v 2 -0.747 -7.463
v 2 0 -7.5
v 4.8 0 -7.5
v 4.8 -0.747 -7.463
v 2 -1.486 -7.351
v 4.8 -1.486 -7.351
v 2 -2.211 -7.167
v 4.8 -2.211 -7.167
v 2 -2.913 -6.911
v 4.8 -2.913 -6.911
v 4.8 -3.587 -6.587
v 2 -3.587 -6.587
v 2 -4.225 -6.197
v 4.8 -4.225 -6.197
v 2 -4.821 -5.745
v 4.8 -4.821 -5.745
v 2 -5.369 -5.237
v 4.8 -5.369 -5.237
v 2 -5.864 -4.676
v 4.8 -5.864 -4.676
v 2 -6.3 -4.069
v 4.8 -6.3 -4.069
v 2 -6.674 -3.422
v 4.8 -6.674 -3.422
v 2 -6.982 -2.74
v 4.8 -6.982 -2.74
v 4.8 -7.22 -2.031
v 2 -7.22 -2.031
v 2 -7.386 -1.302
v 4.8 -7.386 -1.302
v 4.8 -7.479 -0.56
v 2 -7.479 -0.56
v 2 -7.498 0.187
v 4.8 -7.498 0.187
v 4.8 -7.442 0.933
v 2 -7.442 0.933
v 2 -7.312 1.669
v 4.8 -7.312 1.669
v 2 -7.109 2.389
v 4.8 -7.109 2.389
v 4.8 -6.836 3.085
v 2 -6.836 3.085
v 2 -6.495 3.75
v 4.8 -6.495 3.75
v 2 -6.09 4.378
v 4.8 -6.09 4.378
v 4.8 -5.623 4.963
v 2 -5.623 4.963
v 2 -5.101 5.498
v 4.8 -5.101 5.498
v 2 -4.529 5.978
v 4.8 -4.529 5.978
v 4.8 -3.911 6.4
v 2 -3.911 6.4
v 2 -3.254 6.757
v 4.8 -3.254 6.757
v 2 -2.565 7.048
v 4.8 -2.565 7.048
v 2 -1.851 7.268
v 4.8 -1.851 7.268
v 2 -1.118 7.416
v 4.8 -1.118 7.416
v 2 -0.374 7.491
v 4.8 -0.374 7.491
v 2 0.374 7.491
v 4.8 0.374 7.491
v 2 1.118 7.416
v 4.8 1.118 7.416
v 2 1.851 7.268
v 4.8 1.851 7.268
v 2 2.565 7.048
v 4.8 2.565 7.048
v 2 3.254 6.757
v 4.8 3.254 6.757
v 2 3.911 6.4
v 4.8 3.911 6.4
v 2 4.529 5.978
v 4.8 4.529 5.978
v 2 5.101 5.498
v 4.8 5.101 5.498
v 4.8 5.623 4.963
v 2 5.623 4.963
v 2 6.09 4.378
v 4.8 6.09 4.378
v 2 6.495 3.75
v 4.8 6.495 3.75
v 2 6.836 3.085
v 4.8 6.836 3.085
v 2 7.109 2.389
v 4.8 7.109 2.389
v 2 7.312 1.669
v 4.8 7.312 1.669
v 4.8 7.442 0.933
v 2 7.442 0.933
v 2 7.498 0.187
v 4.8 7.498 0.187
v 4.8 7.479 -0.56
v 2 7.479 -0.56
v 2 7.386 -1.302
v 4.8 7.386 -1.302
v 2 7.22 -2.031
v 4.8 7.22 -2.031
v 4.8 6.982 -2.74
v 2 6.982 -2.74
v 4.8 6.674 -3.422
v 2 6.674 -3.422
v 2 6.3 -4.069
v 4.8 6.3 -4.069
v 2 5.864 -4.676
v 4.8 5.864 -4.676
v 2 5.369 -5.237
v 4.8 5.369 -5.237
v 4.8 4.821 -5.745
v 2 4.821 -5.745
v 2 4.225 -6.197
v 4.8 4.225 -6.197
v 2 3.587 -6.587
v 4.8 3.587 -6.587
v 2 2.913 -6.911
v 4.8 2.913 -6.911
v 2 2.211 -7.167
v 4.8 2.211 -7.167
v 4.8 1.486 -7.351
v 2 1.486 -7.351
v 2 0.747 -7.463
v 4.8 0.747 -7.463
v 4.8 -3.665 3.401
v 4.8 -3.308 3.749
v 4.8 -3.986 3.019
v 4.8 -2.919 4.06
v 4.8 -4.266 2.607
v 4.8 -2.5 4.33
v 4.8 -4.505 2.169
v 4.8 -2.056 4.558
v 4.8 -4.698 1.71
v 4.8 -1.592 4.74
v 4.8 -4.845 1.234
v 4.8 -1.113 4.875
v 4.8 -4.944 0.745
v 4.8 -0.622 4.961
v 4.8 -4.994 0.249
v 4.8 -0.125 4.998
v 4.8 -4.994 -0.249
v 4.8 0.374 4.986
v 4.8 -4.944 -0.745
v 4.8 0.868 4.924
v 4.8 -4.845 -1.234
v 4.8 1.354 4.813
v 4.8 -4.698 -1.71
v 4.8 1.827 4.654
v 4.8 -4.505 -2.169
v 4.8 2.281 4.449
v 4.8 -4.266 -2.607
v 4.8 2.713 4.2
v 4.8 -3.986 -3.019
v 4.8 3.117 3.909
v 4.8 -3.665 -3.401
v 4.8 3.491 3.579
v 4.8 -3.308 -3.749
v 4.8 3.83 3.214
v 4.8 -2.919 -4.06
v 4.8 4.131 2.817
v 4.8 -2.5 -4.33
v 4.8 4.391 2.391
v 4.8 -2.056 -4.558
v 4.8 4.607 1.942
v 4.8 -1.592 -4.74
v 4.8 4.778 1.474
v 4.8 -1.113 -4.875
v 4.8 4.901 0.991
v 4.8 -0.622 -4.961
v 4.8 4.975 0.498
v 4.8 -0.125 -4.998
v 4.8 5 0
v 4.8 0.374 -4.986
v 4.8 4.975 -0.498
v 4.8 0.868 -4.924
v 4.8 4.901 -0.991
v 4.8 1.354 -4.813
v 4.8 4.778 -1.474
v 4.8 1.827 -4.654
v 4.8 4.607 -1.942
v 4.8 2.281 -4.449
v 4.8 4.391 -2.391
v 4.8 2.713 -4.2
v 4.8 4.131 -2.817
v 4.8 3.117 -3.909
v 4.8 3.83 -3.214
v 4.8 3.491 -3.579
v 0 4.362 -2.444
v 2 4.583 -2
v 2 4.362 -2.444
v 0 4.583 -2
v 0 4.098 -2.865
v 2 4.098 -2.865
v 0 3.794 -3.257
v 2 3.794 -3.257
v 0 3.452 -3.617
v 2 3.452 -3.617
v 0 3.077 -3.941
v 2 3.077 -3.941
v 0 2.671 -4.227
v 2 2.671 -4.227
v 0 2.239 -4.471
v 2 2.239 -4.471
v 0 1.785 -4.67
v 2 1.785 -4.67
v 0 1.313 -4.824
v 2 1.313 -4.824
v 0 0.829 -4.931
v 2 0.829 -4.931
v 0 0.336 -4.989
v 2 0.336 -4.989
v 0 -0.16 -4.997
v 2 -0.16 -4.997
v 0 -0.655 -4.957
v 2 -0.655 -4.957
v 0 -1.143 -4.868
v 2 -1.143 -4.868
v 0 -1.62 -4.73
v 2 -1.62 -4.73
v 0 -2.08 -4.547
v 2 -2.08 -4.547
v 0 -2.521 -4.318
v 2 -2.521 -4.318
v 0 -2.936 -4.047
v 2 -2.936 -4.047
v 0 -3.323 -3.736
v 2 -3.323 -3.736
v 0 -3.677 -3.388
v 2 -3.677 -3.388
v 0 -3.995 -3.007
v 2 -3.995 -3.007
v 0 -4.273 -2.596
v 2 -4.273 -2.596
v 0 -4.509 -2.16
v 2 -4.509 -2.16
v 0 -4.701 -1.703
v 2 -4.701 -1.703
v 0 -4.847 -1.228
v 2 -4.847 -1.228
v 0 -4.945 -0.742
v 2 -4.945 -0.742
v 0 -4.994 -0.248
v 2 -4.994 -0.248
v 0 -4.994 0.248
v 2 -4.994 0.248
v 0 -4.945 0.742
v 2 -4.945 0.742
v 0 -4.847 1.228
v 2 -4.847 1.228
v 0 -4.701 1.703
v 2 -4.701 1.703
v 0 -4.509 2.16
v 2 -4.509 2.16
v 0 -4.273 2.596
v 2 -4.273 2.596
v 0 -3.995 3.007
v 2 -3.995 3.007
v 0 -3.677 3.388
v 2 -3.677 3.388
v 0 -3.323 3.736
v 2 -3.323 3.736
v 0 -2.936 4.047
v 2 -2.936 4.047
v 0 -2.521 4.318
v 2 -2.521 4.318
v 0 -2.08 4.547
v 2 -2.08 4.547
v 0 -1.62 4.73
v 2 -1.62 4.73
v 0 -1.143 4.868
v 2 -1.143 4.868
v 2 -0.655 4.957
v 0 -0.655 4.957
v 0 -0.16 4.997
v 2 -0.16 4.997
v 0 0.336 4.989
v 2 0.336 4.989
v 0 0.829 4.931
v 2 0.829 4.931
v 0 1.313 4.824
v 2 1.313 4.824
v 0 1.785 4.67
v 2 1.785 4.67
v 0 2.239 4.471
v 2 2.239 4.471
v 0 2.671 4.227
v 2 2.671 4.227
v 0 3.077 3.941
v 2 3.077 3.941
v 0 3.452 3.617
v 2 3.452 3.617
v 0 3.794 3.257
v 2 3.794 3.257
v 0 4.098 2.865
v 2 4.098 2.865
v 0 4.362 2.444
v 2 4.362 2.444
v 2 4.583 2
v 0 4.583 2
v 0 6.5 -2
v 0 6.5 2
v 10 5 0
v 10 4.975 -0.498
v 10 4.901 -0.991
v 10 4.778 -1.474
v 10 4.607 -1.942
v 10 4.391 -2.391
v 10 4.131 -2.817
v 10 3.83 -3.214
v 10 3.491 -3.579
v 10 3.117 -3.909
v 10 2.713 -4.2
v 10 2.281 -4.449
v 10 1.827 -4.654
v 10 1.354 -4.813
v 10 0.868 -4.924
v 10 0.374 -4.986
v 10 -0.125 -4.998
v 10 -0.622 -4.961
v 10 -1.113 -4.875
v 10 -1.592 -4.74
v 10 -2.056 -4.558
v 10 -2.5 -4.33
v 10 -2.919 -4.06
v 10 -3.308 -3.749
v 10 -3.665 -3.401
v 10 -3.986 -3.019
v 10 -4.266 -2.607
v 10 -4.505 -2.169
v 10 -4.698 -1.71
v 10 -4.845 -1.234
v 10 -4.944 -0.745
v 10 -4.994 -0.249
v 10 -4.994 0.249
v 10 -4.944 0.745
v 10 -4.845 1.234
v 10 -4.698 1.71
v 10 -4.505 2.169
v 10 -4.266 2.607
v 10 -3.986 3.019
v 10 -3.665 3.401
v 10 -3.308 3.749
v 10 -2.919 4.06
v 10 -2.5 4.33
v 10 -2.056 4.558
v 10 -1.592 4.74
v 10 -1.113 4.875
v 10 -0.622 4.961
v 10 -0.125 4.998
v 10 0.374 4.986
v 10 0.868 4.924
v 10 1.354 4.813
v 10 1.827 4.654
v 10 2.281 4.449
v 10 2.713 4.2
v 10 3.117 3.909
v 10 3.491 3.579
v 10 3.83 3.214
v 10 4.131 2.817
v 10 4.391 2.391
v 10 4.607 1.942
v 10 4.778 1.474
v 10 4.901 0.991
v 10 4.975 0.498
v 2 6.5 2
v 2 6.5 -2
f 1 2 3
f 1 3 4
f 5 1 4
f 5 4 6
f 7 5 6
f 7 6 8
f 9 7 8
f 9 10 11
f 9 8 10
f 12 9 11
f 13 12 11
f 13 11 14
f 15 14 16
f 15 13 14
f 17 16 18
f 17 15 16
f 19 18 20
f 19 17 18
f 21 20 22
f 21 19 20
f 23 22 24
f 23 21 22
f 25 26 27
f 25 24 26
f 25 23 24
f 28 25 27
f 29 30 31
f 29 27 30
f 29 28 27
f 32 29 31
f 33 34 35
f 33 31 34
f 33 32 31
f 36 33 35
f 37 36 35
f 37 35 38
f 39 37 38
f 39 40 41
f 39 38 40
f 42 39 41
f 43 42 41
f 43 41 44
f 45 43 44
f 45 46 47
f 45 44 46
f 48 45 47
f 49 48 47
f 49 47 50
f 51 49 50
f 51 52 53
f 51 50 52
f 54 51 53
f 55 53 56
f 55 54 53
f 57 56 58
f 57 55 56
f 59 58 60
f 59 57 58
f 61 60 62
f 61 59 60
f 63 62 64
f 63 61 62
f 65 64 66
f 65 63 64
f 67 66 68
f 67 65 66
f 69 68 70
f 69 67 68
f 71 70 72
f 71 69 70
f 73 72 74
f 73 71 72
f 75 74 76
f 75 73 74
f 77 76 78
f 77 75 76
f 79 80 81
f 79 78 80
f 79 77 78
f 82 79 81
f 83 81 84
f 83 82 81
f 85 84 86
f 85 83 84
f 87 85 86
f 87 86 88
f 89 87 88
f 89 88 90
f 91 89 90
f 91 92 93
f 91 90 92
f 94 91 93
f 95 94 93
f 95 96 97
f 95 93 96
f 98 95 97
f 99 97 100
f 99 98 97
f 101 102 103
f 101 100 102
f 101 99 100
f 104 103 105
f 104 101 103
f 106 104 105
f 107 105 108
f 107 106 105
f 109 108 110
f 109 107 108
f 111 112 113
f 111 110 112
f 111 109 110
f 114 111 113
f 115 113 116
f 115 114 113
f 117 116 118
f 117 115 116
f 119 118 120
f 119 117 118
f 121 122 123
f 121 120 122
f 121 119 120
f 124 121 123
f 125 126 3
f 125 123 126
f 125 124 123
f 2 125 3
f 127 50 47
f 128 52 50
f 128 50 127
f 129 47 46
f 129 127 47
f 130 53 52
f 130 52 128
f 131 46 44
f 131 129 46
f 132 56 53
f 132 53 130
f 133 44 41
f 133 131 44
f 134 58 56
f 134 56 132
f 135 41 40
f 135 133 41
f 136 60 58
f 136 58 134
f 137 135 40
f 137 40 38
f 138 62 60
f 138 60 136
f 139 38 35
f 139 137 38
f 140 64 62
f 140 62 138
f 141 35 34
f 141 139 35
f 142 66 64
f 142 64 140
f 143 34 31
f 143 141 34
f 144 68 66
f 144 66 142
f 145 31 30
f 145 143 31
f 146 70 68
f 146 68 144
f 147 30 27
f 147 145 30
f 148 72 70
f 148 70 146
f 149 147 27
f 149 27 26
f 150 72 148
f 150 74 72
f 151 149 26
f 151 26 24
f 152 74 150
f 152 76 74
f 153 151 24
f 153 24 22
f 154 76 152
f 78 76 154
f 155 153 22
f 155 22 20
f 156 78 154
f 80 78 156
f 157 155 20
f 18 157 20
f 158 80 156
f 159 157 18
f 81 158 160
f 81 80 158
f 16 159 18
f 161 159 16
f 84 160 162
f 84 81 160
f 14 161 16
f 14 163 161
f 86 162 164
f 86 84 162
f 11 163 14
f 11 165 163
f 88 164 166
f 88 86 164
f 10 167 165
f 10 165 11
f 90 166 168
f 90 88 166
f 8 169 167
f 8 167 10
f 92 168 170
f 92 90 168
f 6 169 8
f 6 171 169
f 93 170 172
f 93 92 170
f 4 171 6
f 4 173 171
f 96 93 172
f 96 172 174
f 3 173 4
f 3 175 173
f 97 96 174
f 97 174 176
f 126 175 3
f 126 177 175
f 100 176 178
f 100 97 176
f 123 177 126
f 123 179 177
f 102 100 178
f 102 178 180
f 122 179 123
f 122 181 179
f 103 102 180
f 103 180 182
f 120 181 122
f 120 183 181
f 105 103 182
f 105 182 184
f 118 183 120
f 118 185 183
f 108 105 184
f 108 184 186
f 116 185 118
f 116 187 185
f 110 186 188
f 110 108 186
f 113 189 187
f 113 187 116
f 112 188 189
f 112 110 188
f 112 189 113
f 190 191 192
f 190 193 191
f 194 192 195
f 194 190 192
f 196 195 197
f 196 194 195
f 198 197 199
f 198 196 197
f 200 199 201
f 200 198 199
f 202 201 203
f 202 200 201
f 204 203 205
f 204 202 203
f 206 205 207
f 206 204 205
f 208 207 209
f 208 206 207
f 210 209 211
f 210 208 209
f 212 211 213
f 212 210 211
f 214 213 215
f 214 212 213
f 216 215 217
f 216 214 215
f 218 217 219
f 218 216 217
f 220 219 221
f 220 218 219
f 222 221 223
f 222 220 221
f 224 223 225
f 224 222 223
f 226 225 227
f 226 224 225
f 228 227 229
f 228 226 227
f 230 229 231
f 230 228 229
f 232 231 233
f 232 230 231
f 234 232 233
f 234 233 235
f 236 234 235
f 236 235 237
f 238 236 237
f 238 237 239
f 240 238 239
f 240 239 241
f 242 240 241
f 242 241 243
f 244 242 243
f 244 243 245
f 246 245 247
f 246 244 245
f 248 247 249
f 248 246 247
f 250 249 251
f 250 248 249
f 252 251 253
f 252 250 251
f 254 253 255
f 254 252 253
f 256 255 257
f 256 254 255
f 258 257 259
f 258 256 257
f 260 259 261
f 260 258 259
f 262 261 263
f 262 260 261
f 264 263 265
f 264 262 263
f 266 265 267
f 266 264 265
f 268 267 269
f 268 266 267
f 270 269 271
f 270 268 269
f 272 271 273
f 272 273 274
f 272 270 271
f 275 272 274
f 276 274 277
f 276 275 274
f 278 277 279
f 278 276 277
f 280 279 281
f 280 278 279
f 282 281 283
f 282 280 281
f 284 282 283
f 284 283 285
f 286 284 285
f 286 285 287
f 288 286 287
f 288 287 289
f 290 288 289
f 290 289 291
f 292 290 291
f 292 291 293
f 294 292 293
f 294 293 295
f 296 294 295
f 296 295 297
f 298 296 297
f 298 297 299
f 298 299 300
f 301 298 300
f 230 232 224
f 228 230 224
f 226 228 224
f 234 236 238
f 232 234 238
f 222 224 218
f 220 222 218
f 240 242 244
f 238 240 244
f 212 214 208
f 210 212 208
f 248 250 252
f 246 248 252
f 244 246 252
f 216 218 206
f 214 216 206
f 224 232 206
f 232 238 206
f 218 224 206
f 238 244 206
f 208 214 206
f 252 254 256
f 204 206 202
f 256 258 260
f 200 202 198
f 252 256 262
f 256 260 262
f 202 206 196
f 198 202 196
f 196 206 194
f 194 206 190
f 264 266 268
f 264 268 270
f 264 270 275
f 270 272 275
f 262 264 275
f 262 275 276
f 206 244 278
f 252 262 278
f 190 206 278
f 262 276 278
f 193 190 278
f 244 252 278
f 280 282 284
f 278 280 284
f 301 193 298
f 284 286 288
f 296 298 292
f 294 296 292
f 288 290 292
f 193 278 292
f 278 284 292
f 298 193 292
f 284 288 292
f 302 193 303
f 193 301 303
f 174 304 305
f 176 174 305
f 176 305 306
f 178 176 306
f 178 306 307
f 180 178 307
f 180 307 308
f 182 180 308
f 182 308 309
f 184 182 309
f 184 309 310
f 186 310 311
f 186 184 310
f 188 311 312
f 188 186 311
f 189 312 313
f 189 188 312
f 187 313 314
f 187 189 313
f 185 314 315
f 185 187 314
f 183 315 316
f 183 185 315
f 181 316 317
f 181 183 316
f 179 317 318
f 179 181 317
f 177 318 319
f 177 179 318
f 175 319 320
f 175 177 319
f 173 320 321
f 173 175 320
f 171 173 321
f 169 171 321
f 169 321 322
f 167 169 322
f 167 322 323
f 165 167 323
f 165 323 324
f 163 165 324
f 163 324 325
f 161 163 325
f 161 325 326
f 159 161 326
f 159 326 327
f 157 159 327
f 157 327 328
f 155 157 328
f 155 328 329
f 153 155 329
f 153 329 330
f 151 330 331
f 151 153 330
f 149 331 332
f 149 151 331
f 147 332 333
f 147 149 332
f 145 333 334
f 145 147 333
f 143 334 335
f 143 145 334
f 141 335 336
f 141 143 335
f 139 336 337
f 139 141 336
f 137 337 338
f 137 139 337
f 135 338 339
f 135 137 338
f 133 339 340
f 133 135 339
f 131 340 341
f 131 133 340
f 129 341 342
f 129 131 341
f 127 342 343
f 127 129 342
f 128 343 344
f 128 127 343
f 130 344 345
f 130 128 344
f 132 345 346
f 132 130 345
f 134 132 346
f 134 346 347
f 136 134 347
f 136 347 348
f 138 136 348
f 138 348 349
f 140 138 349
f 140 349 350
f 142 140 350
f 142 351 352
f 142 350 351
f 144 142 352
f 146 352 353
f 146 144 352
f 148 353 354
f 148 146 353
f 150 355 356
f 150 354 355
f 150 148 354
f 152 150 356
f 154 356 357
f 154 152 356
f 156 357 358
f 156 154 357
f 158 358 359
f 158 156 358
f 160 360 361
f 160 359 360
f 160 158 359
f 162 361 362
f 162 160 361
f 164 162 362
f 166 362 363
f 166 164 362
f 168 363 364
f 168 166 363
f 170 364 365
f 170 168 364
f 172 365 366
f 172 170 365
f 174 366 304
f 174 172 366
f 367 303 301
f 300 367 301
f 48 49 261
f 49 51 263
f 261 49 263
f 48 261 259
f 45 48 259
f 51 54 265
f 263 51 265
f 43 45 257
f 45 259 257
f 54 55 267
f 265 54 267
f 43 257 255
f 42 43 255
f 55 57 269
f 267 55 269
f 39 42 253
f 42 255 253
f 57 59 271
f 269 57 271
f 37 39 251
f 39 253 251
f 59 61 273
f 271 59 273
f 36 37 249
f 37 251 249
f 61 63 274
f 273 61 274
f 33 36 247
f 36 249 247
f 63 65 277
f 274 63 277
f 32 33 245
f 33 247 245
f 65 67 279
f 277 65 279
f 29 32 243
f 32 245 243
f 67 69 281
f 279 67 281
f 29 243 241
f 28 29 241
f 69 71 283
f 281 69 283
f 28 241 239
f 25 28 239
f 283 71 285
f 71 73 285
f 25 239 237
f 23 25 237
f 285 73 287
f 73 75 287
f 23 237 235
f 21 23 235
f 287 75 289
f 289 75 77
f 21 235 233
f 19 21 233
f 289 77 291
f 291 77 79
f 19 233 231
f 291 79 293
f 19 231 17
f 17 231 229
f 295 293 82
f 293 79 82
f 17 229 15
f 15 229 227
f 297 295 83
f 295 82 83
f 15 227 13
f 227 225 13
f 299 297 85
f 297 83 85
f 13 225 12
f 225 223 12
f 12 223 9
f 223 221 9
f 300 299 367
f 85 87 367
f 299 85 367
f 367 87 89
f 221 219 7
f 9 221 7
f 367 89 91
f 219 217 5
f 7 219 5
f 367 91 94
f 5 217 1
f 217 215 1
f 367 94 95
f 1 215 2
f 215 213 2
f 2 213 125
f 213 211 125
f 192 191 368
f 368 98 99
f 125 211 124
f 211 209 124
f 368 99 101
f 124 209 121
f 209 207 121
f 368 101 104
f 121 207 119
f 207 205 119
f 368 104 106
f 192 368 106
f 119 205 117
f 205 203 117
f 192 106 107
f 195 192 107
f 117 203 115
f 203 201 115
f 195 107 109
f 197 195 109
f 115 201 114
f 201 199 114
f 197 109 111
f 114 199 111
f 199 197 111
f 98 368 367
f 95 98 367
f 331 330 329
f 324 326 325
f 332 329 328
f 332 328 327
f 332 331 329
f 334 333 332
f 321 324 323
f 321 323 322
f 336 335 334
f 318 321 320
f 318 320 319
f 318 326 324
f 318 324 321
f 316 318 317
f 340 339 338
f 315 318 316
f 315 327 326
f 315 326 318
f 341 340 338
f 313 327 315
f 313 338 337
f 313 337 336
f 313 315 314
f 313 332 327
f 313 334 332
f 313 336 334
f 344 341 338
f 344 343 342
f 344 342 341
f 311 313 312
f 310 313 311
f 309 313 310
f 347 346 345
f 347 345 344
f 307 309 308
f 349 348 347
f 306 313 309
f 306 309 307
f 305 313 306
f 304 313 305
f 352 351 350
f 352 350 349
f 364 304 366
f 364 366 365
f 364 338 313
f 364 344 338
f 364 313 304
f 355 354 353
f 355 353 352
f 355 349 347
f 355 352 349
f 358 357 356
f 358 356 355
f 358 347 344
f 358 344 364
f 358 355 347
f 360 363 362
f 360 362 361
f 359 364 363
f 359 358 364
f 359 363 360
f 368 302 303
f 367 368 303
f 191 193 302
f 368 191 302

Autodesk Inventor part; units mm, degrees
ref_plane "YZ Plane" through (0, 0, 0) normal (1, 0, 0) x (0, 1, 0)
ref_plane "XZ Plane" through (0, 0, 0) normal (0, 1, 0) x (-1, 0, 0)
ref_plane "XY Plane" through (0, 0, 0) normal (0, 0, 1) x (1, 0, 0)
sketch "Sketch1" plane through (0, 0, 0) normal (1, 0, 0) x (0, 1, 0)
  circle A0 centre (0, 0) radius 5
  dimension "d0" = 10
extrude "Extrusion1" add sketch "Sketch1" along normal blind 10
sketch "Sketch2" plane through (0, 0, 0) normal (-1, 0, 0) x (0, 0, 1)
  circle A0 centre (0, 0) radius 5 projected
  line L0 (-2, 6.5) -> (2, 6.5)
  line L1 (2, 6.5) -> (2, 0)
  line L2 (2, 0) -> (-2, 0)
  line L3 (-2, 0) -> (-2, 6.5)
  point P0 (0, -5)
  point P1 (-2, 4.5826)
  point P2 (2, 4.5826)
  dimension "d3" = 11.5
  dimension "d4" = 4
extrude "Extrusion2" add sketch "Sketch2" against normal blind 2 contours A0 L3 L0 L1
sketch "Sketch3" plane through (2, 0, 0) normal (1, 0, 0) x (0, 0, -1)
  circle A0 centre (0, 0) radius 7.5
  dimension "d7" = 15
extrude "Extrusion3" add sketch "Sketch3" along normal blind 2.8
properties part number "PIEZA_AYUDA" material "Steel, Mild, Welded"
